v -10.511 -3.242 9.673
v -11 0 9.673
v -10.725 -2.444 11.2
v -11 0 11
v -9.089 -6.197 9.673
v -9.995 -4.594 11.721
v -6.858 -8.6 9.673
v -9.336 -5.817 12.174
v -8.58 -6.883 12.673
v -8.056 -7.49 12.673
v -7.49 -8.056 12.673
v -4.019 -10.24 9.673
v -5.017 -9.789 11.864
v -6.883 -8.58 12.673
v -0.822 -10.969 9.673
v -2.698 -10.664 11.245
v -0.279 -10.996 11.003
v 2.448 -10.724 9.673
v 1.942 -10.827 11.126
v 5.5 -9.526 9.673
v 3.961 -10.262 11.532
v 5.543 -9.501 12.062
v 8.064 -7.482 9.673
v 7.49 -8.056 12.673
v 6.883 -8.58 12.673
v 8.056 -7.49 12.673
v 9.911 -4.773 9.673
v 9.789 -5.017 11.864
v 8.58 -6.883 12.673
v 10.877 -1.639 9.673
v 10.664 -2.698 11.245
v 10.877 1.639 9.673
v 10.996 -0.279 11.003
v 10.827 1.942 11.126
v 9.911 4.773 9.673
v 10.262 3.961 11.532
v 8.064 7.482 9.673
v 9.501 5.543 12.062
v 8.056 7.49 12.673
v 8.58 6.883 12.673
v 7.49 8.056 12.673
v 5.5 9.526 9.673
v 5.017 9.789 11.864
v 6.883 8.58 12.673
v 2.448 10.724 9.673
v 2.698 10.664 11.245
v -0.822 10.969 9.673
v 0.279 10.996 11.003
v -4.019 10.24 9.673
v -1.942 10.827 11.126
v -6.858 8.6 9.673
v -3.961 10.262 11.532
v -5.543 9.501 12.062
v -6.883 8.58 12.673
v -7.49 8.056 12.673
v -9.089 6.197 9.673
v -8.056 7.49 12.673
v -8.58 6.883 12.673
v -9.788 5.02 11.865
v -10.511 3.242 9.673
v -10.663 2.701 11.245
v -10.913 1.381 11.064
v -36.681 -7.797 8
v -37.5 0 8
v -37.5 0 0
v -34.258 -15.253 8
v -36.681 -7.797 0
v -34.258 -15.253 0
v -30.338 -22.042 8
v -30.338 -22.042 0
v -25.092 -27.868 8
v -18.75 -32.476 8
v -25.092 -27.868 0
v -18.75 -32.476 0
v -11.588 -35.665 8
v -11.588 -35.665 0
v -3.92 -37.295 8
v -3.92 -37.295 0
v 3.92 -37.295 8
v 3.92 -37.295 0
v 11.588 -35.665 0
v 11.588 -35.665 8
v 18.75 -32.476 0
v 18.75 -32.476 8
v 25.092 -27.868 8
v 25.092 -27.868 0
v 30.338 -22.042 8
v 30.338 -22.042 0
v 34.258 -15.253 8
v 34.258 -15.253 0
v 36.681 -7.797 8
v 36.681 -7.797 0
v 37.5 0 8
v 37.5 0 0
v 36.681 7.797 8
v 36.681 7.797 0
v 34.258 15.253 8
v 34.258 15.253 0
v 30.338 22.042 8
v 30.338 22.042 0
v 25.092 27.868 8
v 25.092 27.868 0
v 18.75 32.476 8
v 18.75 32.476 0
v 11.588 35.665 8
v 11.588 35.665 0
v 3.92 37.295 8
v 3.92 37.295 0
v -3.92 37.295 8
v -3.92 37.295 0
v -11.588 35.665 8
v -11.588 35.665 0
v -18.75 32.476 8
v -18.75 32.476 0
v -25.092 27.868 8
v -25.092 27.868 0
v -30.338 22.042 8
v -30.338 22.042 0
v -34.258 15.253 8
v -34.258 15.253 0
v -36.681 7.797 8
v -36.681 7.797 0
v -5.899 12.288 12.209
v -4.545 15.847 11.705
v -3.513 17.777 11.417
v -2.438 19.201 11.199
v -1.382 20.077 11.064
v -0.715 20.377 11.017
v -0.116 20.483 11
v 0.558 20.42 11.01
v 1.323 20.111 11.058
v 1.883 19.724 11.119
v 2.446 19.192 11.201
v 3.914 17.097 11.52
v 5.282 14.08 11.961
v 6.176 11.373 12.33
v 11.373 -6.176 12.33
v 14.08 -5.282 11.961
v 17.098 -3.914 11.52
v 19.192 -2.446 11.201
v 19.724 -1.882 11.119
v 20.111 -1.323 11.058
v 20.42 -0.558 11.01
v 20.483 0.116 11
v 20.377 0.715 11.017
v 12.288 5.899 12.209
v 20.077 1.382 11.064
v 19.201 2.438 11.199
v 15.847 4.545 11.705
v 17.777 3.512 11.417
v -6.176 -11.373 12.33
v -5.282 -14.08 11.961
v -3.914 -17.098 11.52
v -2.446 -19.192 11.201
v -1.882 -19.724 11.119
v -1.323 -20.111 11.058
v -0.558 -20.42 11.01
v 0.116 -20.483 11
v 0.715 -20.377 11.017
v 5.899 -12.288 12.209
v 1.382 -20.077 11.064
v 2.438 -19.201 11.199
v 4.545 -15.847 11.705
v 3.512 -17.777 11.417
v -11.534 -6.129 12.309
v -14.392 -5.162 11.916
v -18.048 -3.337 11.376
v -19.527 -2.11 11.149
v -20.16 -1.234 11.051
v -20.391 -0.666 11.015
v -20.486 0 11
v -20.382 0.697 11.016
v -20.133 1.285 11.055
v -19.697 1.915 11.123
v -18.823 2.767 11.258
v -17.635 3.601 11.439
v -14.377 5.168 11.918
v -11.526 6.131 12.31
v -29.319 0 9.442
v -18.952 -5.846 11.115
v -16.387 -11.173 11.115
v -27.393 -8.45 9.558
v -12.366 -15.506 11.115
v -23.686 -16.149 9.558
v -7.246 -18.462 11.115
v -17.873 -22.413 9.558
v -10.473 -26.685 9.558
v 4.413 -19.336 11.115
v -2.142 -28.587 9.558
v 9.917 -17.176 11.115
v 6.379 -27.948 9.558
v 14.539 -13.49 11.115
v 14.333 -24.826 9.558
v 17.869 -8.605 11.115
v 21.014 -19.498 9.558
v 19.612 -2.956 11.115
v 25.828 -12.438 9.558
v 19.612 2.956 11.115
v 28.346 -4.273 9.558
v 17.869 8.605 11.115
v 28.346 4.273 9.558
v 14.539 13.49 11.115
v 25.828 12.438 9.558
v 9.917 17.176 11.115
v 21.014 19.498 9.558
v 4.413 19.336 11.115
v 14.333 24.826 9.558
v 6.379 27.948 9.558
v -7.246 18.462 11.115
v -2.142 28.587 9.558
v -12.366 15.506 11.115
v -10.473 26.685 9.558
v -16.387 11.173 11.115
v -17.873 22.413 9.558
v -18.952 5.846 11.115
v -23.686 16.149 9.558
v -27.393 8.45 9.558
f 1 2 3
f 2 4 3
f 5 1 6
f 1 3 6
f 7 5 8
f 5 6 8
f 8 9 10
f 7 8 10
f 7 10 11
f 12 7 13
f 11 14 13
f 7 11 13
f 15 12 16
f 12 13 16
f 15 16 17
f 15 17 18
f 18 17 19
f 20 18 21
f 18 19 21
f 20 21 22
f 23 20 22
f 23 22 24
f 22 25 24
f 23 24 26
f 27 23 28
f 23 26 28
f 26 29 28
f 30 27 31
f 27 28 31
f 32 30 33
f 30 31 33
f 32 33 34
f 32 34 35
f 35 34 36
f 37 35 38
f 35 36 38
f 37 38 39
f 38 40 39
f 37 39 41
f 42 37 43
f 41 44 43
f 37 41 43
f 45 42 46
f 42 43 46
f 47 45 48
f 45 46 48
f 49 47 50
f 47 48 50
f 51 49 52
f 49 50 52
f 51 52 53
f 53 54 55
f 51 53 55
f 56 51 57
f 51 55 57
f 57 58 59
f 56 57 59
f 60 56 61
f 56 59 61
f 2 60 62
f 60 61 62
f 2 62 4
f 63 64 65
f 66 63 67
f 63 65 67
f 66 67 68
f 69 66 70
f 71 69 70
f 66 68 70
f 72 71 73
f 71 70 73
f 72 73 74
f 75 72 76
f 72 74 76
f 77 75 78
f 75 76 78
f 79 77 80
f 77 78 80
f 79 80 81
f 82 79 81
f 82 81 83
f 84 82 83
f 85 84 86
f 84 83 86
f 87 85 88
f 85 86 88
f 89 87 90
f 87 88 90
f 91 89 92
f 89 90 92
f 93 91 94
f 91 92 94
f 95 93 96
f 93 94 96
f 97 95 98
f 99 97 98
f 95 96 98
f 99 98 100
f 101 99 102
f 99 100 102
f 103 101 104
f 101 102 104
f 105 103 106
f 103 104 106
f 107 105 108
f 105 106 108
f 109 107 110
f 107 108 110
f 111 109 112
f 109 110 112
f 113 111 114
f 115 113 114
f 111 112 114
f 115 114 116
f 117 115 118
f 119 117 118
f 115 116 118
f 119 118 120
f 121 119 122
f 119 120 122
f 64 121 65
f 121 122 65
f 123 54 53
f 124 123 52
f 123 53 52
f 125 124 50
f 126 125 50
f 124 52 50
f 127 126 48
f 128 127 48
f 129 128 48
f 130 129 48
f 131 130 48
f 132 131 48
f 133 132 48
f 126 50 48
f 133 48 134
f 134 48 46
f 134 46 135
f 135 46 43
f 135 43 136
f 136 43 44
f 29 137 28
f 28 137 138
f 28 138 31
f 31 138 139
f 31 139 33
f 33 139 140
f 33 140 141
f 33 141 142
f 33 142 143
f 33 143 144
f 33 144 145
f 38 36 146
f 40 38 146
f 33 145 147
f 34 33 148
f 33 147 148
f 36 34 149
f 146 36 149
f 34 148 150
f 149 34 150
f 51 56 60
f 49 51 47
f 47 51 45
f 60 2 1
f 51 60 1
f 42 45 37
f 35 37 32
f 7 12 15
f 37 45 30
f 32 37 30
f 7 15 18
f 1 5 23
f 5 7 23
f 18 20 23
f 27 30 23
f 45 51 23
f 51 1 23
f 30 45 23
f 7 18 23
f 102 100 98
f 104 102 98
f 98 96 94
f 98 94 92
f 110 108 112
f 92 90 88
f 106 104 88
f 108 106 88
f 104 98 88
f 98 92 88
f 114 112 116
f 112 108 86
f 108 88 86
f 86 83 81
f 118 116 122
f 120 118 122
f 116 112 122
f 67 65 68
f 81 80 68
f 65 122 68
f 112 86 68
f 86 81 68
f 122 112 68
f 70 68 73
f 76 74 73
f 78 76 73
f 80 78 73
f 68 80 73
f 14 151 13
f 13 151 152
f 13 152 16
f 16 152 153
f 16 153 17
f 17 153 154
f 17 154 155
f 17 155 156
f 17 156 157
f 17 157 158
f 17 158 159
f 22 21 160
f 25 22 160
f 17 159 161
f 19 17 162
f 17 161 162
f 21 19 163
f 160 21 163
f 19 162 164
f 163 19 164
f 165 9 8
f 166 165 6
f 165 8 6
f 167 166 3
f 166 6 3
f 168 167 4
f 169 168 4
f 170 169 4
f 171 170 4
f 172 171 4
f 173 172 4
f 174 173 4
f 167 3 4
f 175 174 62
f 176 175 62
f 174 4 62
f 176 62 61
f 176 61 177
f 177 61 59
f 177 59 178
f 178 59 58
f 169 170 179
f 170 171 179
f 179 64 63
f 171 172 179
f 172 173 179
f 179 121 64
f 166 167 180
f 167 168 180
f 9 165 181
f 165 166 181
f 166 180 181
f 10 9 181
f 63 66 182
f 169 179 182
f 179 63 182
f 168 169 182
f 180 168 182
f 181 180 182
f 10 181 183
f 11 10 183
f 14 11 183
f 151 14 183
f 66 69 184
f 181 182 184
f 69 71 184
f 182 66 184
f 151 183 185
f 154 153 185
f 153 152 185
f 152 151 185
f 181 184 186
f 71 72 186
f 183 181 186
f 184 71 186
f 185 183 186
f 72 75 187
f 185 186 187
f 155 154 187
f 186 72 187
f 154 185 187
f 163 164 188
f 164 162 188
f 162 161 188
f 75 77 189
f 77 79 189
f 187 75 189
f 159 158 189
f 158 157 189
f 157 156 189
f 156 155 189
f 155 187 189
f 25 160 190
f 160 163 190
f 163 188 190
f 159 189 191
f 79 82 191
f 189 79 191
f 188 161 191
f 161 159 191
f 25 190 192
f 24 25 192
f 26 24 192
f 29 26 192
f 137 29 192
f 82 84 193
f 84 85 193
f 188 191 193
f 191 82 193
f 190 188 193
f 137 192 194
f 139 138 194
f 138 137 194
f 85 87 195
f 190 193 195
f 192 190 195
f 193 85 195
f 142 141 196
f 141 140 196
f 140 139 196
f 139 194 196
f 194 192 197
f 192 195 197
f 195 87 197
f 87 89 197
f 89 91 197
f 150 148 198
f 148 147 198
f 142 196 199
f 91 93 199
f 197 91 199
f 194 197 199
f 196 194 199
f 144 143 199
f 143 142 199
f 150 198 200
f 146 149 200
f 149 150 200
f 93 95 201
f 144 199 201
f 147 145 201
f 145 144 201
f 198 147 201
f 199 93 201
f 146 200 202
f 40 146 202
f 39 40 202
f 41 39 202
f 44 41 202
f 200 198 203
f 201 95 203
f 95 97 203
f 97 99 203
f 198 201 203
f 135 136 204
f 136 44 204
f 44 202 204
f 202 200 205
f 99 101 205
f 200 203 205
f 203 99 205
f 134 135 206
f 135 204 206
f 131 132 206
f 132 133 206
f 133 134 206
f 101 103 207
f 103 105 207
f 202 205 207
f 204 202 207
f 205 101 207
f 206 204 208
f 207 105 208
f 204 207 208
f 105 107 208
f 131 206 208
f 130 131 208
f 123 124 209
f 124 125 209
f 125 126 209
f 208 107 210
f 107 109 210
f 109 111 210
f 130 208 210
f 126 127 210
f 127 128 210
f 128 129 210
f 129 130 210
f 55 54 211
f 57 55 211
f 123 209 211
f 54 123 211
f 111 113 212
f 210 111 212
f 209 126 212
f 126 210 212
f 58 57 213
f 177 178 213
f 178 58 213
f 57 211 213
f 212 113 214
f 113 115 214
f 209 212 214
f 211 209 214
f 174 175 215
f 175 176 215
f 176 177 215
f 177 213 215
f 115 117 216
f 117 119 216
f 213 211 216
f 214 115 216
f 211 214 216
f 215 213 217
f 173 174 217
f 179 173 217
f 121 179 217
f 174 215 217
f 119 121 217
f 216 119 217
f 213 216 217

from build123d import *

# Parameters (mm, degrees)
F2_R     = 15
F3_DEPTH = 40
F4_ANGLE = 90


with BuildPart() as f1:
    # F0 (on Front) → F1 (revolve)
    with BuildSketch(Plane.XZ):
        Polygon((-37.5, 8), (-37.5, 0), (0, 0), (0, 9.672665), (-11, 9.672665), (-11, 12.672665), align=None)
    revolve(axis=Axis((0, 0, -11.012315), (0, 0, 1)))


with BuildPart() as f3:
    # F2 (on Front) → F3 (new body, symmetric)
    with BuildSketch(Plane.XZ):
        with Locations((0, 26)):
            Circle(F2_R)
    extrude(amount=F3_DEPTH, both=True)


with BuildPart() as f4_1:
    # F4: copy of F3
    add(f3.part.rotate(Axis((0, 0, -11.012315), (0, 0, 1)), F4_ANGLE))


with BuildPart() as f1_1:
    add(f1.part)

    # F5: cut F3, F4_1
    add(f3.part, mode=Mode.SUBTRACT)
    add(f4_1.part, mode=Mode.SUBTRACT)


solid = f1_1.part
